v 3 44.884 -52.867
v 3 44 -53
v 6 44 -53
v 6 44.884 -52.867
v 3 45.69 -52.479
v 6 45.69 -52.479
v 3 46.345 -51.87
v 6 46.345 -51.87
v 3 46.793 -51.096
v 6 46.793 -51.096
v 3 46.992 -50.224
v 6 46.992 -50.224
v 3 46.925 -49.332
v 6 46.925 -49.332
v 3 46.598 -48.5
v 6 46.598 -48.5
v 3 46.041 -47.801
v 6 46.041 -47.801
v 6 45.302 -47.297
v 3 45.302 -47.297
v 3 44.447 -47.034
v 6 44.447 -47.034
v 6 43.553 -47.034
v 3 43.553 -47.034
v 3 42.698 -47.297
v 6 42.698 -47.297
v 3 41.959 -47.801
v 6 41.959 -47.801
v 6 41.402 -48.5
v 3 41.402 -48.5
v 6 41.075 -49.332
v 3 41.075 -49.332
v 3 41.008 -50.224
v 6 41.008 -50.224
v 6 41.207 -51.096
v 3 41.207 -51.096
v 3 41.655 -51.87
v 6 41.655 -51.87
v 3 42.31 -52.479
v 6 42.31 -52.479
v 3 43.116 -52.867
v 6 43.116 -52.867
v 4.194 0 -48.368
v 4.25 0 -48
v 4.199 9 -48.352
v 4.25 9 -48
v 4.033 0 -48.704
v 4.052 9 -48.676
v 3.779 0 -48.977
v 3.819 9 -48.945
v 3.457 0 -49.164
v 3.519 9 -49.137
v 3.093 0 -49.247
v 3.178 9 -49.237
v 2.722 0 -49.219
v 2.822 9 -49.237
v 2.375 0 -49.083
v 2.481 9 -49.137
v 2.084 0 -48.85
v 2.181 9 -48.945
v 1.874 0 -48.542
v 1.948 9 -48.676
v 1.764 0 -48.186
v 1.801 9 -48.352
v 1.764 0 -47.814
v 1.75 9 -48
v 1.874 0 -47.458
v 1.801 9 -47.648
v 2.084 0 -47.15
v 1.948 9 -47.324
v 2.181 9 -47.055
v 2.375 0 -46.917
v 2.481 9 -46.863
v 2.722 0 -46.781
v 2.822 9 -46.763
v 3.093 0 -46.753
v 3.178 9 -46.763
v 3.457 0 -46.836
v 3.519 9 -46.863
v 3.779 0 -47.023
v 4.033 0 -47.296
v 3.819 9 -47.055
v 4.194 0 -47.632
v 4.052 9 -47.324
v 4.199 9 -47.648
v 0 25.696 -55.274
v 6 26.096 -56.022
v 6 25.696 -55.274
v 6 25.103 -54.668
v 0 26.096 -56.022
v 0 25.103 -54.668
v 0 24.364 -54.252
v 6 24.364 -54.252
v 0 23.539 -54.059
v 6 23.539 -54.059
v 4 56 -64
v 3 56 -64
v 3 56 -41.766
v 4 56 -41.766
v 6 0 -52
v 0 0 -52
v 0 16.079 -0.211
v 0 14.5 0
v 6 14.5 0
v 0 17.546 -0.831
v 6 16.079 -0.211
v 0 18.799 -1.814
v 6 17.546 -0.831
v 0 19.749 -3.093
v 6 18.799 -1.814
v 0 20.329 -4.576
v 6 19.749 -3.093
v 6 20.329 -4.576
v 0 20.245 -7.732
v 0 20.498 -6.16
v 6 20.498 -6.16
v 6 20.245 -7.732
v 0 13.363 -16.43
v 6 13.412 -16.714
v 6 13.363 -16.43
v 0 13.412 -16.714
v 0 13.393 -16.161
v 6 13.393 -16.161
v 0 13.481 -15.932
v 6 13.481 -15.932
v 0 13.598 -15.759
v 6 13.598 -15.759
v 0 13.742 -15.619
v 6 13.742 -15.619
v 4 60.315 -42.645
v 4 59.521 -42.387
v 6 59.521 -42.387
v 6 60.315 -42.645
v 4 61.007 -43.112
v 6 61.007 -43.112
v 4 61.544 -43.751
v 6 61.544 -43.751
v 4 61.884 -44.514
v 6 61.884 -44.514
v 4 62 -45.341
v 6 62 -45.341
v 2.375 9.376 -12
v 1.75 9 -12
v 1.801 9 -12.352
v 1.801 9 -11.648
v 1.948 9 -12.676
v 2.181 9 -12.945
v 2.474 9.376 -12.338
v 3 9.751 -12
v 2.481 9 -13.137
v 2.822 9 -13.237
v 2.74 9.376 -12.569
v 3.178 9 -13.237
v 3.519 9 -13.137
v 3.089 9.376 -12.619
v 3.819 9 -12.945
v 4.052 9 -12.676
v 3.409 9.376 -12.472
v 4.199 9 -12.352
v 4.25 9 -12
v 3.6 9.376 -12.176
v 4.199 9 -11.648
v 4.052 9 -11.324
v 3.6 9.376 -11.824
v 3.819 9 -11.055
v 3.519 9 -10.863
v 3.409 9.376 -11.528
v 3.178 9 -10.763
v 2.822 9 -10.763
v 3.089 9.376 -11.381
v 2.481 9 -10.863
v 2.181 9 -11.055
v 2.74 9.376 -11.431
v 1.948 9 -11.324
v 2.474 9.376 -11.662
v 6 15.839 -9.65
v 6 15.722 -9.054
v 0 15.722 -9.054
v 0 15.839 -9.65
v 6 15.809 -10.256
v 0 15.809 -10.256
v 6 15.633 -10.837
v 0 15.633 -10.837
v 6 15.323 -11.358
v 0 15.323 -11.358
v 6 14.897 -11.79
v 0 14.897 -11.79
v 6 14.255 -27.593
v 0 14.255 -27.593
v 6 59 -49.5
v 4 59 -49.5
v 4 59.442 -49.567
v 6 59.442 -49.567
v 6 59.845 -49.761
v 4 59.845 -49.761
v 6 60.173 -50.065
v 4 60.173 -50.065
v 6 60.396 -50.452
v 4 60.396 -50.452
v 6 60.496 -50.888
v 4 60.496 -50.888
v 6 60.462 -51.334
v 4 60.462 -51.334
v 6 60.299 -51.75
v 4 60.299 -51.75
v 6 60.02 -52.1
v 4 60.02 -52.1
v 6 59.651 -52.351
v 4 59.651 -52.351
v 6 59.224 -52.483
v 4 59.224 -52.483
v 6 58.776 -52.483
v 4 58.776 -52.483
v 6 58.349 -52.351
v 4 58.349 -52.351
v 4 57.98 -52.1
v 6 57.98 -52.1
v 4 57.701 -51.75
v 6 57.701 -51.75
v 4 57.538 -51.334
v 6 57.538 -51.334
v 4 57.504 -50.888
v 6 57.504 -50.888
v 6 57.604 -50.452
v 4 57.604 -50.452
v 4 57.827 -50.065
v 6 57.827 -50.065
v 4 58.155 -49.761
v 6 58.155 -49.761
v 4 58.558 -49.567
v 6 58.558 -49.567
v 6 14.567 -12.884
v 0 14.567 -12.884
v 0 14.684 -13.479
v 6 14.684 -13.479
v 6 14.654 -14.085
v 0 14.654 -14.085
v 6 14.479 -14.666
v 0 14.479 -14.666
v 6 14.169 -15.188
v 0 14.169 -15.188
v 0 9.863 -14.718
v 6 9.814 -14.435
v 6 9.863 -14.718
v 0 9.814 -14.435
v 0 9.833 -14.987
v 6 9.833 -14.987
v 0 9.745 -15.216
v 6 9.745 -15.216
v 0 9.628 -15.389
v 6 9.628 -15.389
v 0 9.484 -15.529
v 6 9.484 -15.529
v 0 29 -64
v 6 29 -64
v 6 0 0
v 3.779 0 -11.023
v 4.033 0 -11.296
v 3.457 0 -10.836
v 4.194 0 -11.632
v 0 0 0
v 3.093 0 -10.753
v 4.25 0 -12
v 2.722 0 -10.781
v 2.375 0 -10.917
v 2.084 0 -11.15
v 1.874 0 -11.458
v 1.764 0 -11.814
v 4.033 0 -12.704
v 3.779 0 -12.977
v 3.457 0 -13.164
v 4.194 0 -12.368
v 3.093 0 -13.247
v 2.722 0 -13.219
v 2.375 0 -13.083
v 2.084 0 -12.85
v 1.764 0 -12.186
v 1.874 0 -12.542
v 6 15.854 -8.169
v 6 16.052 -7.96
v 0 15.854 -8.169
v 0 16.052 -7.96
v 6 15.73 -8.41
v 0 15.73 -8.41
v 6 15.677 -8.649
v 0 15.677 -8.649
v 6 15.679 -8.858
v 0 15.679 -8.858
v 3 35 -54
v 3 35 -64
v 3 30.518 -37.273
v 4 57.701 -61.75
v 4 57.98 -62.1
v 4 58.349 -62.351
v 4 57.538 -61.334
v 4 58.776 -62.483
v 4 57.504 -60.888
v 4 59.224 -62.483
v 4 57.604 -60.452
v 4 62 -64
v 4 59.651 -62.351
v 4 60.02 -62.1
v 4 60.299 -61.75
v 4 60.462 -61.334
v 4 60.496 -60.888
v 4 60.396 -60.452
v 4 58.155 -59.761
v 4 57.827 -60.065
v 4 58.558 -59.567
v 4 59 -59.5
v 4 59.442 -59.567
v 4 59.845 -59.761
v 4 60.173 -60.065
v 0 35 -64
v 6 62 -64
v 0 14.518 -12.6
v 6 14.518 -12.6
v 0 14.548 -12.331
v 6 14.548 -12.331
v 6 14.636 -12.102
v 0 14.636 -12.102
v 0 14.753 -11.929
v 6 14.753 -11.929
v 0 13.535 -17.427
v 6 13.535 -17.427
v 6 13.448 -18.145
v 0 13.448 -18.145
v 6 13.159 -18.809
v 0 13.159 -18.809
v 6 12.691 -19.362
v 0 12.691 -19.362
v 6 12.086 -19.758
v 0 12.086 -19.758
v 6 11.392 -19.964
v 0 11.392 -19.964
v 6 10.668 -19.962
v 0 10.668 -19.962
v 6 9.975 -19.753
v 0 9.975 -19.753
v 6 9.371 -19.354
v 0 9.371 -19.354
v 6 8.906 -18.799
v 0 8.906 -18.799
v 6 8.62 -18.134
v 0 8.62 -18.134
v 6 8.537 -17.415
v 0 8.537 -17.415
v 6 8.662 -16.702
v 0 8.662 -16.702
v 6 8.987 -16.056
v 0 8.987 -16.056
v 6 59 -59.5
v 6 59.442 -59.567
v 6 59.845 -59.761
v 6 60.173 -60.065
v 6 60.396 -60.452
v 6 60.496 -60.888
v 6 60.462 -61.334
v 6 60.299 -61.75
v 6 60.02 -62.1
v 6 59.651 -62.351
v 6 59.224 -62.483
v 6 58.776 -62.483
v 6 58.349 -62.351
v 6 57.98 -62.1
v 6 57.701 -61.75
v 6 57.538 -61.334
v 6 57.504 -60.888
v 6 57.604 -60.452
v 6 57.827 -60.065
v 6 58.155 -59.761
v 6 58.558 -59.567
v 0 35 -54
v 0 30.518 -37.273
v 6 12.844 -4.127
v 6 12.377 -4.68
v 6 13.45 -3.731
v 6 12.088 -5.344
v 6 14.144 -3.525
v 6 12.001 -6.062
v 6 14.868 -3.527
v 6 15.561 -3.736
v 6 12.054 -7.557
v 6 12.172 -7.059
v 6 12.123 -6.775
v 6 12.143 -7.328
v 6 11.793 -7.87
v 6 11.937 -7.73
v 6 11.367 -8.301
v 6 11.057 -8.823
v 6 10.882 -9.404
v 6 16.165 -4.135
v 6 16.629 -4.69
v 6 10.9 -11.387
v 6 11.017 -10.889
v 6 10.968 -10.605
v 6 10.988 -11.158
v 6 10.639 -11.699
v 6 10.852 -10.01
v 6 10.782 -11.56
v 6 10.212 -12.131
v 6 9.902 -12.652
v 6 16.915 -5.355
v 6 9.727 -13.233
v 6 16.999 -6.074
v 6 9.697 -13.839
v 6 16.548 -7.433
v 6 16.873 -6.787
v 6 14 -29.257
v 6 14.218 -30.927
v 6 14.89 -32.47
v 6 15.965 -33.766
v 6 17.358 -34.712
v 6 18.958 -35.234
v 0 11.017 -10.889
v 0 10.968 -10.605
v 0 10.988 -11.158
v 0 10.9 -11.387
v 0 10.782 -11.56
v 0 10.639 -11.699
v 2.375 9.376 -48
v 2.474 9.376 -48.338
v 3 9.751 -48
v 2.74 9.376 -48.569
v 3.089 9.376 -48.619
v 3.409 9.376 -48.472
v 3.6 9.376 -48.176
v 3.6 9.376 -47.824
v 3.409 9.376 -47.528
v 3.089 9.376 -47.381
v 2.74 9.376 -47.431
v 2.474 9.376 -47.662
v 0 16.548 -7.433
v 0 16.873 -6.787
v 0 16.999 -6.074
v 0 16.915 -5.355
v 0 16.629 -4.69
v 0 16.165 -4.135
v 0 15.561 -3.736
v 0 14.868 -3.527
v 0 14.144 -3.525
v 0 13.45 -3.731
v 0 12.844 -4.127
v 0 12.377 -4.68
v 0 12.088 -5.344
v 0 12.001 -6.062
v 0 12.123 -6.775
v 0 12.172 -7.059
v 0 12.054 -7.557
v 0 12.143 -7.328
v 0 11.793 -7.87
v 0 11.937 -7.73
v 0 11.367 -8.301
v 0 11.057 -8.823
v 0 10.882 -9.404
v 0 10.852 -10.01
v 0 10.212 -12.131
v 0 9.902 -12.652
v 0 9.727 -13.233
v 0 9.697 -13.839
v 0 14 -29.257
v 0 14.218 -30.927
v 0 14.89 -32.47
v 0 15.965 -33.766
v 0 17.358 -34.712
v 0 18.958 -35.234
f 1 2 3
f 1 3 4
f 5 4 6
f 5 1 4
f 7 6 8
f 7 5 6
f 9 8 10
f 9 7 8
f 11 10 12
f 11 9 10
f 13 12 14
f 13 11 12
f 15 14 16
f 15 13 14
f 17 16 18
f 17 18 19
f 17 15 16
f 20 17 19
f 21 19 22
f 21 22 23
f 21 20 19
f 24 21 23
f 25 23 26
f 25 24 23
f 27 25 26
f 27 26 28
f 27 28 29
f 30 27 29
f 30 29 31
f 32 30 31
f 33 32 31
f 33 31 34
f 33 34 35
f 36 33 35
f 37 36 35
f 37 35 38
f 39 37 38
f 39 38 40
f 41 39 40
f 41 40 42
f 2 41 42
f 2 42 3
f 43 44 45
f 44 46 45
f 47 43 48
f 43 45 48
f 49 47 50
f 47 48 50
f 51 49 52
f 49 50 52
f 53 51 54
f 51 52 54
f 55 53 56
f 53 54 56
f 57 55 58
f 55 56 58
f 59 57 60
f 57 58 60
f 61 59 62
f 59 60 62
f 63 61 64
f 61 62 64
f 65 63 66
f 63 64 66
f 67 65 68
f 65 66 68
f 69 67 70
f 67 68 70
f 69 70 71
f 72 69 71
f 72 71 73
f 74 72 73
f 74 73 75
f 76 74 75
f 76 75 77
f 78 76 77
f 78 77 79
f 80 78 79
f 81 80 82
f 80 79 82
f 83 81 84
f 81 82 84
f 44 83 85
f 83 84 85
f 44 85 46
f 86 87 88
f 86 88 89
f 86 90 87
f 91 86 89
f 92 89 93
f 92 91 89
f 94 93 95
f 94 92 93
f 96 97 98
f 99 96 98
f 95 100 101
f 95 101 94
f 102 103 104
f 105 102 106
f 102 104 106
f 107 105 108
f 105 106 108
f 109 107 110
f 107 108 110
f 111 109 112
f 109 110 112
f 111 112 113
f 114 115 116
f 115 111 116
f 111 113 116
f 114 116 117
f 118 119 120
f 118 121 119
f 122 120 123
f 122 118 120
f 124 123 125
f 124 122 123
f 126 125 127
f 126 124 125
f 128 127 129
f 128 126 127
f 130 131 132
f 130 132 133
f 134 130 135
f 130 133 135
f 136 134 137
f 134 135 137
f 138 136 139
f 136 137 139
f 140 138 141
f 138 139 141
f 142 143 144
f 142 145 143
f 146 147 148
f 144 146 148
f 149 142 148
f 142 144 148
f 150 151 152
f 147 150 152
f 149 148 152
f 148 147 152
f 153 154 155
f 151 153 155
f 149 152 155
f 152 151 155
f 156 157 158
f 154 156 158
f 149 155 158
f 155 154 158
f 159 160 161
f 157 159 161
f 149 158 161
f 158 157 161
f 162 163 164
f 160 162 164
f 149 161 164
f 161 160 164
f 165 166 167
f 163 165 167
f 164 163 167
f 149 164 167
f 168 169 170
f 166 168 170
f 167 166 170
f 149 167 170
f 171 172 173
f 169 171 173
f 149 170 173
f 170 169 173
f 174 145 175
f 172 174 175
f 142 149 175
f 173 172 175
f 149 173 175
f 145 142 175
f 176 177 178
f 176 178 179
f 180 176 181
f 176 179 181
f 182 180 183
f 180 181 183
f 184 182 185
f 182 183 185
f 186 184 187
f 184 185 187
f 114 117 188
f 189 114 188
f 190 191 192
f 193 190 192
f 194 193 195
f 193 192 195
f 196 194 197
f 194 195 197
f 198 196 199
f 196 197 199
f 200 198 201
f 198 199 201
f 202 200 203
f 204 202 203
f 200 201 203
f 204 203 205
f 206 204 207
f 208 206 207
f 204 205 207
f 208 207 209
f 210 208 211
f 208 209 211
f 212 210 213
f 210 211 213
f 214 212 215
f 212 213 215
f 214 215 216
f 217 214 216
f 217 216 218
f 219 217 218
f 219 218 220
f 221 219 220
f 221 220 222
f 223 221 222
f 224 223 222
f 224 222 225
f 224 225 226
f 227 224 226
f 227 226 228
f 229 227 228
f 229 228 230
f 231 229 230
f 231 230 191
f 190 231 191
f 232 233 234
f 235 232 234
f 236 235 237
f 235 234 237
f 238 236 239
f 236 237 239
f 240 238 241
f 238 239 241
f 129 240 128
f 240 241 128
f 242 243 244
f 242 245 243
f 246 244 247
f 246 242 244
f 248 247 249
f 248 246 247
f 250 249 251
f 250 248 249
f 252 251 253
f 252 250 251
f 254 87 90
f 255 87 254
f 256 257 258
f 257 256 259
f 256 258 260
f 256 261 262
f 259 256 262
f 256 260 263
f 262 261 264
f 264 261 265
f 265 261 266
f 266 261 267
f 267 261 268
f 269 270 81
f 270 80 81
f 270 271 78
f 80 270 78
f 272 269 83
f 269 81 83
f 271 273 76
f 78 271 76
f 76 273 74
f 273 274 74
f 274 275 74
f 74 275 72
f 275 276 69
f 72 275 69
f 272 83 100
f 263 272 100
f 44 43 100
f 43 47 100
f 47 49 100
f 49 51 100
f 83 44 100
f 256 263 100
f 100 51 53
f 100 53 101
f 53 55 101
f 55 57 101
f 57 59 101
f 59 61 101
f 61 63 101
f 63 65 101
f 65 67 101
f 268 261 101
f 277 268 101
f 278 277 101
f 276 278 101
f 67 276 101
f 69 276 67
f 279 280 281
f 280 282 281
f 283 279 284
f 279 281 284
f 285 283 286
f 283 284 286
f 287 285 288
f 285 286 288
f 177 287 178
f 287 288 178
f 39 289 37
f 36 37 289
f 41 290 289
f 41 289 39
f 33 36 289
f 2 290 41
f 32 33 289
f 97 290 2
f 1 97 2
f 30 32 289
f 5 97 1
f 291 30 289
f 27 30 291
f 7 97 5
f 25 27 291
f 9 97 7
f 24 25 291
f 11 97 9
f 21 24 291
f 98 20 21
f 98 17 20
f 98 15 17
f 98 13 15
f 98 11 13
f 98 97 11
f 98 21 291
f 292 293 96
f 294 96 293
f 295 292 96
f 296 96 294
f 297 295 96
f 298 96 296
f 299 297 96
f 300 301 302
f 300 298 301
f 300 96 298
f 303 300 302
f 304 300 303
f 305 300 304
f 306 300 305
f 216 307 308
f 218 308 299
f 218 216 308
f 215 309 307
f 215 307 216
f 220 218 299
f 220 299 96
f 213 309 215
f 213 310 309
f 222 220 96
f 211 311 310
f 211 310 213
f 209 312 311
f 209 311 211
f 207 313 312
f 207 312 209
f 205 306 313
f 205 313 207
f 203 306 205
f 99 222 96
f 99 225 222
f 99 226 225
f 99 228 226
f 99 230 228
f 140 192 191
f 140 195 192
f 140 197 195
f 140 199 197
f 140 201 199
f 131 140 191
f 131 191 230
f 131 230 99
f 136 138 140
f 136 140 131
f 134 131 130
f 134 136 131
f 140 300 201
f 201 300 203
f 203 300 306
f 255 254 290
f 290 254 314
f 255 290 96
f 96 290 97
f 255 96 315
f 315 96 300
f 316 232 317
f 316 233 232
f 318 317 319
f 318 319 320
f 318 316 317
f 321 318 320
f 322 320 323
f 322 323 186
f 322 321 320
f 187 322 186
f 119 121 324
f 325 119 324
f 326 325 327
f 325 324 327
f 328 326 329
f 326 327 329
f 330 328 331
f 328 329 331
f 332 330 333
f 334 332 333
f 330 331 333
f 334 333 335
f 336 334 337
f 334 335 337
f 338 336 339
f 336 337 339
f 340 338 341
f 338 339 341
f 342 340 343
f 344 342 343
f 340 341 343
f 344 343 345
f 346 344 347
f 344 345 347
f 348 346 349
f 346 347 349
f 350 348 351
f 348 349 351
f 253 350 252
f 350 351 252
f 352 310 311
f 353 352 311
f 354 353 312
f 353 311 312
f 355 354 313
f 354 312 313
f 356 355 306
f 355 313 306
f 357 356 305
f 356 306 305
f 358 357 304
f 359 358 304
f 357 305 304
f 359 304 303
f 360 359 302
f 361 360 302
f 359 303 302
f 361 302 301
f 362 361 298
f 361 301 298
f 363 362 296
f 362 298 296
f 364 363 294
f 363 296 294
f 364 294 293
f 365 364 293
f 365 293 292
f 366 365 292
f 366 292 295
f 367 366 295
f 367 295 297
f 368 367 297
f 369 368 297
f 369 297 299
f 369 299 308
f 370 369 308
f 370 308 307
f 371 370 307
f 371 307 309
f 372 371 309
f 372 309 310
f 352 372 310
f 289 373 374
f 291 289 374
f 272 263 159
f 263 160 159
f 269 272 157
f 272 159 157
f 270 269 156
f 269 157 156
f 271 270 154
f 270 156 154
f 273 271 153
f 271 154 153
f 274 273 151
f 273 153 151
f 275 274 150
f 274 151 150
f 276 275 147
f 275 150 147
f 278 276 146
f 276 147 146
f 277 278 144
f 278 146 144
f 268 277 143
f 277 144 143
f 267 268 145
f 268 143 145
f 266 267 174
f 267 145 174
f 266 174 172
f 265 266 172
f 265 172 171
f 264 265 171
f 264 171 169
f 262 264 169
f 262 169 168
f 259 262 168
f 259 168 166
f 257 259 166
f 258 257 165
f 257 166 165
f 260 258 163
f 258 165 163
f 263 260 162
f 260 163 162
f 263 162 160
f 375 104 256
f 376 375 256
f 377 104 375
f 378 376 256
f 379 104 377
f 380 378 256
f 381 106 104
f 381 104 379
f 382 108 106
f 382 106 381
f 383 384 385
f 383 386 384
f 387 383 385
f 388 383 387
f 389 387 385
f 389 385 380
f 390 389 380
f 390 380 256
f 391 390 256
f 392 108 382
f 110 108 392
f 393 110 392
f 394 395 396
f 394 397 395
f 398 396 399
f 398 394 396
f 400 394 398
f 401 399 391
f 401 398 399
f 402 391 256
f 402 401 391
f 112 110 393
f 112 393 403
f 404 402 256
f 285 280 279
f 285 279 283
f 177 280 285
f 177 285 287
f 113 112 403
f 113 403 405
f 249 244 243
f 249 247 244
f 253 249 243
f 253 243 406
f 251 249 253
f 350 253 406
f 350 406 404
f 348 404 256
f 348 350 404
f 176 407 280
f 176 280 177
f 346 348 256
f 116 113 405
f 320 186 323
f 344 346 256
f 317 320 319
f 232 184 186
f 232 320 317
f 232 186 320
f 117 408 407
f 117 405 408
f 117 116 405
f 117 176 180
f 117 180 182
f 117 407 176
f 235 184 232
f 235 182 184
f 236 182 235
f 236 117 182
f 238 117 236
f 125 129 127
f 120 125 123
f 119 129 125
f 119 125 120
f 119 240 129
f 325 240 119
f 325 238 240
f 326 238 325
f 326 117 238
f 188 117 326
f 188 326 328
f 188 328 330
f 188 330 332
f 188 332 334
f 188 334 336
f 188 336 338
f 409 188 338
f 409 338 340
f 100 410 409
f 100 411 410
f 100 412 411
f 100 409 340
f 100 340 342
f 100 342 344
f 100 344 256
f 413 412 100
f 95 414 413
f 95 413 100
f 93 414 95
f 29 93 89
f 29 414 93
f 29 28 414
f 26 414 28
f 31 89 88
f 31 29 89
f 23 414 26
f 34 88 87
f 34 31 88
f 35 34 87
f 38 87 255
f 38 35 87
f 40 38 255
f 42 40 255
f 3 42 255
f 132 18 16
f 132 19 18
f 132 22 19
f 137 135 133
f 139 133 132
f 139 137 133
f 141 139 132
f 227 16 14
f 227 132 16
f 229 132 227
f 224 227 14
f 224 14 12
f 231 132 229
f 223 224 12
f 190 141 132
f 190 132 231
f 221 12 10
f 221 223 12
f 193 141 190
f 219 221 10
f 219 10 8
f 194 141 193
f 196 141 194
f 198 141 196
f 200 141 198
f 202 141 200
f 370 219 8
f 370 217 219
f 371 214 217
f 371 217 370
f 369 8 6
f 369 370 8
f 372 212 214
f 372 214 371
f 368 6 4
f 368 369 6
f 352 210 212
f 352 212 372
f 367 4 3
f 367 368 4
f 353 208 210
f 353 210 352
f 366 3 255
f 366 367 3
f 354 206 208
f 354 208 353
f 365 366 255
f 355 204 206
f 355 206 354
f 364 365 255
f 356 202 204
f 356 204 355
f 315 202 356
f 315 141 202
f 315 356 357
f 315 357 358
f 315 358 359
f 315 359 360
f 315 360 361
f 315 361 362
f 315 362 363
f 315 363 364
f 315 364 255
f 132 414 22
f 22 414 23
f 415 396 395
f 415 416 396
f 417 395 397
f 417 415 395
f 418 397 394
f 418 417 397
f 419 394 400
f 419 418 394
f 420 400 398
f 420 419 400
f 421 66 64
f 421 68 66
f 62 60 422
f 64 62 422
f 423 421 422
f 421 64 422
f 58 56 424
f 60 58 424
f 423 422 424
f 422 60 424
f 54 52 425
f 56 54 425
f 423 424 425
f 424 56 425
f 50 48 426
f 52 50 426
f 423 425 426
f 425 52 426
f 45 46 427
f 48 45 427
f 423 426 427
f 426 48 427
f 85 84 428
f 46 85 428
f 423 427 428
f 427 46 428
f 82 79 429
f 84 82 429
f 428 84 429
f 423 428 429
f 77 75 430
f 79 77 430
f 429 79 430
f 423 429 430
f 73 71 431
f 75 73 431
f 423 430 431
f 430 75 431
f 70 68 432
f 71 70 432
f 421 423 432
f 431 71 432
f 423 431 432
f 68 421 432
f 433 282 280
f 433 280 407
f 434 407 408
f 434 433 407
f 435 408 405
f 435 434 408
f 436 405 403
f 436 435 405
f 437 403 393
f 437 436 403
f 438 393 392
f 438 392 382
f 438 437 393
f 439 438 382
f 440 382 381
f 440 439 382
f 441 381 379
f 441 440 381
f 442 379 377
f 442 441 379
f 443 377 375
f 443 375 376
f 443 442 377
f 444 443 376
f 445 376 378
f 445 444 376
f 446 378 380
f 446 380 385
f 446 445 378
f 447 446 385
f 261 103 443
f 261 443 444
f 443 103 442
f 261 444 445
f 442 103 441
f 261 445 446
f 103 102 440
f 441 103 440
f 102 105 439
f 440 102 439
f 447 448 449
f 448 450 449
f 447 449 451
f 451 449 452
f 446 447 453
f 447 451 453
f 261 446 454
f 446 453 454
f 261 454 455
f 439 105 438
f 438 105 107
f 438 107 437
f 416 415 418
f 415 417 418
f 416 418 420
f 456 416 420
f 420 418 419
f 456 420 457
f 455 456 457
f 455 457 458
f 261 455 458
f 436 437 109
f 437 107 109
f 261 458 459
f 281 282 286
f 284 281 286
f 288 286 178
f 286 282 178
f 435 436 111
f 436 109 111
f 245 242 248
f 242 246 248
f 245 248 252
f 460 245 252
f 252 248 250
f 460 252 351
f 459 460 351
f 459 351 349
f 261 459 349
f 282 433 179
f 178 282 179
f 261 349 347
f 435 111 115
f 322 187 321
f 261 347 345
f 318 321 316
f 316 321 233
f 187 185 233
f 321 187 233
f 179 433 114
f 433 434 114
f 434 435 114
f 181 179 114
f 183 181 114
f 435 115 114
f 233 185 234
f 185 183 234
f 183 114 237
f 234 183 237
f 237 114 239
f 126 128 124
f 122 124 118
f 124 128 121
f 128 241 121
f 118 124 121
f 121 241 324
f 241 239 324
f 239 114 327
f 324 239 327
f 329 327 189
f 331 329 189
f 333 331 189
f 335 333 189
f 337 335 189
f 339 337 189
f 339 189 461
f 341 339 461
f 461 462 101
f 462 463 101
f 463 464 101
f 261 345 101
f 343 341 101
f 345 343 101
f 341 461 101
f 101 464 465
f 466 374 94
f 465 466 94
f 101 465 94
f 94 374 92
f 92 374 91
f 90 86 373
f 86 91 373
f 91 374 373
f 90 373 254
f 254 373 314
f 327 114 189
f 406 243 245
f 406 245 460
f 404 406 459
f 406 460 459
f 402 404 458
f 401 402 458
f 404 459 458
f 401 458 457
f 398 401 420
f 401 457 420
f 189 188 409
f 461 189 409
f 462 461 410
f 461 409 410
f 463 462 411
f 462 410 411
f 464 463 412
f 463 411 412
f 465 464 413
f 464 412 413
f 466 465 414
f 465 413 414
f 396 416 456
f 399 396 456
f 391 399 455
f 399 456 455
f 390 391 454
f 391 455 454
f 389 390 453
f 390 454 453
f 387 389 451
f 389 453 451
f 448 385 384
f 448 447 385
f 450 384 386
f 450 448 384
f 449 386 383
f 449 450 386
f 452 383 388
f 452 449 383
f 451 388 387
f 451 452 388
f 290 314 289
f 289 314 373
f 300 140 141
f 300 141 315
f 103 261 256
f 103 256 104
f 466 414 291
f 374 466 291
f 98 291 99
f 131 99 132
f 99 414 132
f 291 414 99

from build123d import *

# Parameters (mm, degrees)
SKETCH1_W                   = 64
SKETCH1_H                   = 62
SKETCH1_R                   = 2.5
SKETCH1_R_2                 = 3
BOSS_EXTRUDE1_DEPTH         = 6
CUT_EXTRUDE1_REACH          = 8
CUT_EXTRUDE2_REACH          = 8
FILLET1_R                   = 3
FILLET2_R                   = 3
TAP_DRILL_FOR_M3_TAP1_D     = 2.5
TAP_DRILL_FOR_M3_TAP1_DEPTH = 9
TAP_DRILL_FOR_M3_TAP1_TIP   = 0.751075774
CUT_EXTRUDE3_DEPTH          = 3
CUT_EXTRUDE4_REACH          = 5
SKETCH10_R                  = 1.5
SKETCH11_R                  = 2.5
CUT_EXTRUDE5_DEPTH          = 6
LPATTERN1_COUNT             = 3
LPATTERN1_PITCH             = 4
FILLET3_R                   = 1
SKETCH12_W                  = 22.982575198
SKETCH12_H                  = 6
CUT_EXTRUDE6_DEPTH          = 1


with BuildPart() as part:
    # Sketch1 → Boss-Extrude1 (new body)
    with BuildSketch(Plane(origin=(0, 0, 0), x_dir=(0, 0, -1), z_dir=(1, 0, 0))):
        with Locations((32, 31)):
            Rectangle(SKETCH1_W, SKETCH1_H)
        with Locations((6, 14.5)):
            Circle(SKETCH1_R, mode=Mode.SUBTRACT)
        with Locations((50, 44)):
            Circle(SKETCH1_R_2, mode=Mode.SUBTRACT)
    extrude(amount=BOSS_EXTRUDE1_DEPTH)

    # Sketch2 → Cut-Extrude1 (cut, up to next)
    with BuildSketch(Plane(origin=(6, 0, 0), x_dir=(0, 0, -1), z_dir=(1, 0, 0)), mode=Mode.PRIVATE) as cut_extrude1_sk1:
        with BuildLine():
            Line((7.732242893, 20.244504727), (27.593137265, 14.255495273))
            ThreePointArc((27.593137265, 14.255495273), (32.470162023, 14.890171527), (35.234226676, 18.958110934))
            Line((35.234226676, 18.958110934), (43, 63))
            Line((43, 63), (0, 63))
            Line((0, 63), (0, 14.5))
            ThreePointArc((0, 14.5), (2.421834084, 19.316298234), (7.732242893, 20.244504727))
        make_face()
    cut_extrude1_tool1 = extrude(cut_extrude1_sk1.sketch, amount=-CUT_EXTRUDE1_REACH, mode=Mode.PRIVATE) & part.part
    add(cut_extrude1_tool1.solids().sort_by_distance((6, 40.863189, -19.912877))[0], mode=Mode.SUBTRACT)

    # Sketch3 → Cut-Extrude2 (cut, up to next)
    with BuildSketch(Plane(origin=(6, 0, 0), x_dir=(0, 0, -1), z_dir=(1, 0, 0)), mode=Mode.PRIVATE) as cut_extrude2_sk1:
        Polygon((64, 0), (52, 0), (54.225932994, 25.442530542), (64, 29), align=None)
    cut_extrude2_tool1 = extrude(cut_extrude2_sk1.sketch, amount=-CUT_EXTRUDE2_REACH, mode=Mode.PRIVATE) & part.part
    add(cut_extrude2_tool1.solids().sort_by_distance((6, 13.1347, -58.667711))[0], mode=Mode.SUBTRACT)

    # Fillet1
    fillet1_edges = [part.edges().sort_by_distance(p)[0] for p in [
        (3, 62, -42.823673019),
    ]]
    fillet(fillet1_edges, radius=FILLET1_R)

    # Fillet2
    fillet2_edges = [part.edges().sort_by_distance(p)[0] for p in [
        (3, 25.442530542, -54.225932994),
    ]]
    fillet(fillet2_edges, radius=FILLET2_R)

    # Tap Drill for M3 Tap1
    with Locations(Plane(origin=(0, 0, 0), x_dir=(-1, 0, 0), z_dir=(0, -1, 0))):
        with Locations((-3, 48), (-3, 12)):
            Hole(TAP_DRILL_FOR_M3_TAP1_D / 2, depth=TAP_DRILL_FOR_M3_TAP1_DEPTH)
            with Locations((0, 0, -(TAP_DRILL_FOR_M3_TAP1_DEPTH + TAP_DRILL_FOR_M3_TAP1_TIP / 2))):  # 118° drill point
                Cone(0, TAP_DRILL_FOR_M3_TAP1_D / 2, TAP_DRILL_FOR_M3_TAP1_TIP, mode=Mode.SUBTRACT)

    # Sketch9 → Cut-Extrude3 (cut)
    with BuildSketch(Plane.ZY):
        Polygon((-64, 62), (-64, 35), (-54, 35), (-37.272527114, 30.517887149), (-42.823673019, 62), align=None)
    extrude(amount=-CUT_EXTRUDE3_DEPTH, mode=Mode.SUBTRACT)

    # Sketch10 → Cut-Extrude4 (cut, up to next)
    with BuildSketch(Plane.ZY.offset(-3), mode=Mode.PRIVATE) as cut_extrude4_sk1:
        with Locations((-61, 59)):
            Circle(SKETCH10_R)
    cut_extrude4_tool1 = extrude(cut_extrude4_sk1.sketch, amount=-CUT_EXTRUDE4_REACH, mode=Mode.PRIVATE) & part.part
    add(cut_extrude4_tool1.solids().sort_by_distance((3, 59, -61))[0], mode=Mode.SUBTRACT)
    # Sketch10 → Cut-Extrude4 (cut, up to next)
    with BuildSketch(Plane.ZY.offset(-3), mode=Mode.PRIVATE) as cut_extrude4_sk2:
        with Locations((-51, 59)):
            Circle(SKETCH10_R)
    cut_extrude4_tool2 = extrude(cut_extrude4_sk2.sketch, amount=-CUT_EXTRUDE4_REACH, mode=Mode.PRIVATE) & part.part
    add(cut_extrude4_tool2.solids().sort_by_distance((3, 59, -51))[0], mode=Mode.SUBTRACT)

    # Sketch11 → Cut-Extrude5 (cut)
    with BuildSketch(Plane.ZY):
        with Locations((-9.829669818, 13.345171405)):
            Circle(SKETCH11_R)
    cut_extrude5 = extrude(amount=-CUT_EXTRUDE5_DEPTH, mode=Mode.SUBTRACT)

    # LPattern1: Cut-Extrude5 ×3
    with Locations(*[Vector(0, -0.288707149, -0.957417455) * (i * LPATTERN1_PITCH) for i in range(1, LPATTERN1_COUNT)]):
        add(cut_extrude5, mode=Mode.SUBTRACT)

    # Fillet3
    fillet3_edges = [part.edges().sort_by_distance(p)[0] for p in [
        (3, 15.358711884, -8.347895632),
        (3, 12.486459521, -7.481774186),
        (3, 14.203883289, -12.17756545),
        (3, 11.331630925, -11.311444004),
        (3, 10.17680233, -15.141113822),
        (3, 13.049054694, -16.007235268),
    ]]
    fillet(fillet3_edges, radius=FILLET3_R)

    # Sketch12 → Cut-Extrude6 (cut)
    with BuildSketch(Plane.ZY.offset(-3)):
        with Locations((-52.508712401, 59)):
            Rectangle(SKETCH12_W, SKETCH12_H)
    extrude(amount=-CUT_EXTRUDE6_DEPTH, mode=Mode.SUBTRACT)


solid = part.part
